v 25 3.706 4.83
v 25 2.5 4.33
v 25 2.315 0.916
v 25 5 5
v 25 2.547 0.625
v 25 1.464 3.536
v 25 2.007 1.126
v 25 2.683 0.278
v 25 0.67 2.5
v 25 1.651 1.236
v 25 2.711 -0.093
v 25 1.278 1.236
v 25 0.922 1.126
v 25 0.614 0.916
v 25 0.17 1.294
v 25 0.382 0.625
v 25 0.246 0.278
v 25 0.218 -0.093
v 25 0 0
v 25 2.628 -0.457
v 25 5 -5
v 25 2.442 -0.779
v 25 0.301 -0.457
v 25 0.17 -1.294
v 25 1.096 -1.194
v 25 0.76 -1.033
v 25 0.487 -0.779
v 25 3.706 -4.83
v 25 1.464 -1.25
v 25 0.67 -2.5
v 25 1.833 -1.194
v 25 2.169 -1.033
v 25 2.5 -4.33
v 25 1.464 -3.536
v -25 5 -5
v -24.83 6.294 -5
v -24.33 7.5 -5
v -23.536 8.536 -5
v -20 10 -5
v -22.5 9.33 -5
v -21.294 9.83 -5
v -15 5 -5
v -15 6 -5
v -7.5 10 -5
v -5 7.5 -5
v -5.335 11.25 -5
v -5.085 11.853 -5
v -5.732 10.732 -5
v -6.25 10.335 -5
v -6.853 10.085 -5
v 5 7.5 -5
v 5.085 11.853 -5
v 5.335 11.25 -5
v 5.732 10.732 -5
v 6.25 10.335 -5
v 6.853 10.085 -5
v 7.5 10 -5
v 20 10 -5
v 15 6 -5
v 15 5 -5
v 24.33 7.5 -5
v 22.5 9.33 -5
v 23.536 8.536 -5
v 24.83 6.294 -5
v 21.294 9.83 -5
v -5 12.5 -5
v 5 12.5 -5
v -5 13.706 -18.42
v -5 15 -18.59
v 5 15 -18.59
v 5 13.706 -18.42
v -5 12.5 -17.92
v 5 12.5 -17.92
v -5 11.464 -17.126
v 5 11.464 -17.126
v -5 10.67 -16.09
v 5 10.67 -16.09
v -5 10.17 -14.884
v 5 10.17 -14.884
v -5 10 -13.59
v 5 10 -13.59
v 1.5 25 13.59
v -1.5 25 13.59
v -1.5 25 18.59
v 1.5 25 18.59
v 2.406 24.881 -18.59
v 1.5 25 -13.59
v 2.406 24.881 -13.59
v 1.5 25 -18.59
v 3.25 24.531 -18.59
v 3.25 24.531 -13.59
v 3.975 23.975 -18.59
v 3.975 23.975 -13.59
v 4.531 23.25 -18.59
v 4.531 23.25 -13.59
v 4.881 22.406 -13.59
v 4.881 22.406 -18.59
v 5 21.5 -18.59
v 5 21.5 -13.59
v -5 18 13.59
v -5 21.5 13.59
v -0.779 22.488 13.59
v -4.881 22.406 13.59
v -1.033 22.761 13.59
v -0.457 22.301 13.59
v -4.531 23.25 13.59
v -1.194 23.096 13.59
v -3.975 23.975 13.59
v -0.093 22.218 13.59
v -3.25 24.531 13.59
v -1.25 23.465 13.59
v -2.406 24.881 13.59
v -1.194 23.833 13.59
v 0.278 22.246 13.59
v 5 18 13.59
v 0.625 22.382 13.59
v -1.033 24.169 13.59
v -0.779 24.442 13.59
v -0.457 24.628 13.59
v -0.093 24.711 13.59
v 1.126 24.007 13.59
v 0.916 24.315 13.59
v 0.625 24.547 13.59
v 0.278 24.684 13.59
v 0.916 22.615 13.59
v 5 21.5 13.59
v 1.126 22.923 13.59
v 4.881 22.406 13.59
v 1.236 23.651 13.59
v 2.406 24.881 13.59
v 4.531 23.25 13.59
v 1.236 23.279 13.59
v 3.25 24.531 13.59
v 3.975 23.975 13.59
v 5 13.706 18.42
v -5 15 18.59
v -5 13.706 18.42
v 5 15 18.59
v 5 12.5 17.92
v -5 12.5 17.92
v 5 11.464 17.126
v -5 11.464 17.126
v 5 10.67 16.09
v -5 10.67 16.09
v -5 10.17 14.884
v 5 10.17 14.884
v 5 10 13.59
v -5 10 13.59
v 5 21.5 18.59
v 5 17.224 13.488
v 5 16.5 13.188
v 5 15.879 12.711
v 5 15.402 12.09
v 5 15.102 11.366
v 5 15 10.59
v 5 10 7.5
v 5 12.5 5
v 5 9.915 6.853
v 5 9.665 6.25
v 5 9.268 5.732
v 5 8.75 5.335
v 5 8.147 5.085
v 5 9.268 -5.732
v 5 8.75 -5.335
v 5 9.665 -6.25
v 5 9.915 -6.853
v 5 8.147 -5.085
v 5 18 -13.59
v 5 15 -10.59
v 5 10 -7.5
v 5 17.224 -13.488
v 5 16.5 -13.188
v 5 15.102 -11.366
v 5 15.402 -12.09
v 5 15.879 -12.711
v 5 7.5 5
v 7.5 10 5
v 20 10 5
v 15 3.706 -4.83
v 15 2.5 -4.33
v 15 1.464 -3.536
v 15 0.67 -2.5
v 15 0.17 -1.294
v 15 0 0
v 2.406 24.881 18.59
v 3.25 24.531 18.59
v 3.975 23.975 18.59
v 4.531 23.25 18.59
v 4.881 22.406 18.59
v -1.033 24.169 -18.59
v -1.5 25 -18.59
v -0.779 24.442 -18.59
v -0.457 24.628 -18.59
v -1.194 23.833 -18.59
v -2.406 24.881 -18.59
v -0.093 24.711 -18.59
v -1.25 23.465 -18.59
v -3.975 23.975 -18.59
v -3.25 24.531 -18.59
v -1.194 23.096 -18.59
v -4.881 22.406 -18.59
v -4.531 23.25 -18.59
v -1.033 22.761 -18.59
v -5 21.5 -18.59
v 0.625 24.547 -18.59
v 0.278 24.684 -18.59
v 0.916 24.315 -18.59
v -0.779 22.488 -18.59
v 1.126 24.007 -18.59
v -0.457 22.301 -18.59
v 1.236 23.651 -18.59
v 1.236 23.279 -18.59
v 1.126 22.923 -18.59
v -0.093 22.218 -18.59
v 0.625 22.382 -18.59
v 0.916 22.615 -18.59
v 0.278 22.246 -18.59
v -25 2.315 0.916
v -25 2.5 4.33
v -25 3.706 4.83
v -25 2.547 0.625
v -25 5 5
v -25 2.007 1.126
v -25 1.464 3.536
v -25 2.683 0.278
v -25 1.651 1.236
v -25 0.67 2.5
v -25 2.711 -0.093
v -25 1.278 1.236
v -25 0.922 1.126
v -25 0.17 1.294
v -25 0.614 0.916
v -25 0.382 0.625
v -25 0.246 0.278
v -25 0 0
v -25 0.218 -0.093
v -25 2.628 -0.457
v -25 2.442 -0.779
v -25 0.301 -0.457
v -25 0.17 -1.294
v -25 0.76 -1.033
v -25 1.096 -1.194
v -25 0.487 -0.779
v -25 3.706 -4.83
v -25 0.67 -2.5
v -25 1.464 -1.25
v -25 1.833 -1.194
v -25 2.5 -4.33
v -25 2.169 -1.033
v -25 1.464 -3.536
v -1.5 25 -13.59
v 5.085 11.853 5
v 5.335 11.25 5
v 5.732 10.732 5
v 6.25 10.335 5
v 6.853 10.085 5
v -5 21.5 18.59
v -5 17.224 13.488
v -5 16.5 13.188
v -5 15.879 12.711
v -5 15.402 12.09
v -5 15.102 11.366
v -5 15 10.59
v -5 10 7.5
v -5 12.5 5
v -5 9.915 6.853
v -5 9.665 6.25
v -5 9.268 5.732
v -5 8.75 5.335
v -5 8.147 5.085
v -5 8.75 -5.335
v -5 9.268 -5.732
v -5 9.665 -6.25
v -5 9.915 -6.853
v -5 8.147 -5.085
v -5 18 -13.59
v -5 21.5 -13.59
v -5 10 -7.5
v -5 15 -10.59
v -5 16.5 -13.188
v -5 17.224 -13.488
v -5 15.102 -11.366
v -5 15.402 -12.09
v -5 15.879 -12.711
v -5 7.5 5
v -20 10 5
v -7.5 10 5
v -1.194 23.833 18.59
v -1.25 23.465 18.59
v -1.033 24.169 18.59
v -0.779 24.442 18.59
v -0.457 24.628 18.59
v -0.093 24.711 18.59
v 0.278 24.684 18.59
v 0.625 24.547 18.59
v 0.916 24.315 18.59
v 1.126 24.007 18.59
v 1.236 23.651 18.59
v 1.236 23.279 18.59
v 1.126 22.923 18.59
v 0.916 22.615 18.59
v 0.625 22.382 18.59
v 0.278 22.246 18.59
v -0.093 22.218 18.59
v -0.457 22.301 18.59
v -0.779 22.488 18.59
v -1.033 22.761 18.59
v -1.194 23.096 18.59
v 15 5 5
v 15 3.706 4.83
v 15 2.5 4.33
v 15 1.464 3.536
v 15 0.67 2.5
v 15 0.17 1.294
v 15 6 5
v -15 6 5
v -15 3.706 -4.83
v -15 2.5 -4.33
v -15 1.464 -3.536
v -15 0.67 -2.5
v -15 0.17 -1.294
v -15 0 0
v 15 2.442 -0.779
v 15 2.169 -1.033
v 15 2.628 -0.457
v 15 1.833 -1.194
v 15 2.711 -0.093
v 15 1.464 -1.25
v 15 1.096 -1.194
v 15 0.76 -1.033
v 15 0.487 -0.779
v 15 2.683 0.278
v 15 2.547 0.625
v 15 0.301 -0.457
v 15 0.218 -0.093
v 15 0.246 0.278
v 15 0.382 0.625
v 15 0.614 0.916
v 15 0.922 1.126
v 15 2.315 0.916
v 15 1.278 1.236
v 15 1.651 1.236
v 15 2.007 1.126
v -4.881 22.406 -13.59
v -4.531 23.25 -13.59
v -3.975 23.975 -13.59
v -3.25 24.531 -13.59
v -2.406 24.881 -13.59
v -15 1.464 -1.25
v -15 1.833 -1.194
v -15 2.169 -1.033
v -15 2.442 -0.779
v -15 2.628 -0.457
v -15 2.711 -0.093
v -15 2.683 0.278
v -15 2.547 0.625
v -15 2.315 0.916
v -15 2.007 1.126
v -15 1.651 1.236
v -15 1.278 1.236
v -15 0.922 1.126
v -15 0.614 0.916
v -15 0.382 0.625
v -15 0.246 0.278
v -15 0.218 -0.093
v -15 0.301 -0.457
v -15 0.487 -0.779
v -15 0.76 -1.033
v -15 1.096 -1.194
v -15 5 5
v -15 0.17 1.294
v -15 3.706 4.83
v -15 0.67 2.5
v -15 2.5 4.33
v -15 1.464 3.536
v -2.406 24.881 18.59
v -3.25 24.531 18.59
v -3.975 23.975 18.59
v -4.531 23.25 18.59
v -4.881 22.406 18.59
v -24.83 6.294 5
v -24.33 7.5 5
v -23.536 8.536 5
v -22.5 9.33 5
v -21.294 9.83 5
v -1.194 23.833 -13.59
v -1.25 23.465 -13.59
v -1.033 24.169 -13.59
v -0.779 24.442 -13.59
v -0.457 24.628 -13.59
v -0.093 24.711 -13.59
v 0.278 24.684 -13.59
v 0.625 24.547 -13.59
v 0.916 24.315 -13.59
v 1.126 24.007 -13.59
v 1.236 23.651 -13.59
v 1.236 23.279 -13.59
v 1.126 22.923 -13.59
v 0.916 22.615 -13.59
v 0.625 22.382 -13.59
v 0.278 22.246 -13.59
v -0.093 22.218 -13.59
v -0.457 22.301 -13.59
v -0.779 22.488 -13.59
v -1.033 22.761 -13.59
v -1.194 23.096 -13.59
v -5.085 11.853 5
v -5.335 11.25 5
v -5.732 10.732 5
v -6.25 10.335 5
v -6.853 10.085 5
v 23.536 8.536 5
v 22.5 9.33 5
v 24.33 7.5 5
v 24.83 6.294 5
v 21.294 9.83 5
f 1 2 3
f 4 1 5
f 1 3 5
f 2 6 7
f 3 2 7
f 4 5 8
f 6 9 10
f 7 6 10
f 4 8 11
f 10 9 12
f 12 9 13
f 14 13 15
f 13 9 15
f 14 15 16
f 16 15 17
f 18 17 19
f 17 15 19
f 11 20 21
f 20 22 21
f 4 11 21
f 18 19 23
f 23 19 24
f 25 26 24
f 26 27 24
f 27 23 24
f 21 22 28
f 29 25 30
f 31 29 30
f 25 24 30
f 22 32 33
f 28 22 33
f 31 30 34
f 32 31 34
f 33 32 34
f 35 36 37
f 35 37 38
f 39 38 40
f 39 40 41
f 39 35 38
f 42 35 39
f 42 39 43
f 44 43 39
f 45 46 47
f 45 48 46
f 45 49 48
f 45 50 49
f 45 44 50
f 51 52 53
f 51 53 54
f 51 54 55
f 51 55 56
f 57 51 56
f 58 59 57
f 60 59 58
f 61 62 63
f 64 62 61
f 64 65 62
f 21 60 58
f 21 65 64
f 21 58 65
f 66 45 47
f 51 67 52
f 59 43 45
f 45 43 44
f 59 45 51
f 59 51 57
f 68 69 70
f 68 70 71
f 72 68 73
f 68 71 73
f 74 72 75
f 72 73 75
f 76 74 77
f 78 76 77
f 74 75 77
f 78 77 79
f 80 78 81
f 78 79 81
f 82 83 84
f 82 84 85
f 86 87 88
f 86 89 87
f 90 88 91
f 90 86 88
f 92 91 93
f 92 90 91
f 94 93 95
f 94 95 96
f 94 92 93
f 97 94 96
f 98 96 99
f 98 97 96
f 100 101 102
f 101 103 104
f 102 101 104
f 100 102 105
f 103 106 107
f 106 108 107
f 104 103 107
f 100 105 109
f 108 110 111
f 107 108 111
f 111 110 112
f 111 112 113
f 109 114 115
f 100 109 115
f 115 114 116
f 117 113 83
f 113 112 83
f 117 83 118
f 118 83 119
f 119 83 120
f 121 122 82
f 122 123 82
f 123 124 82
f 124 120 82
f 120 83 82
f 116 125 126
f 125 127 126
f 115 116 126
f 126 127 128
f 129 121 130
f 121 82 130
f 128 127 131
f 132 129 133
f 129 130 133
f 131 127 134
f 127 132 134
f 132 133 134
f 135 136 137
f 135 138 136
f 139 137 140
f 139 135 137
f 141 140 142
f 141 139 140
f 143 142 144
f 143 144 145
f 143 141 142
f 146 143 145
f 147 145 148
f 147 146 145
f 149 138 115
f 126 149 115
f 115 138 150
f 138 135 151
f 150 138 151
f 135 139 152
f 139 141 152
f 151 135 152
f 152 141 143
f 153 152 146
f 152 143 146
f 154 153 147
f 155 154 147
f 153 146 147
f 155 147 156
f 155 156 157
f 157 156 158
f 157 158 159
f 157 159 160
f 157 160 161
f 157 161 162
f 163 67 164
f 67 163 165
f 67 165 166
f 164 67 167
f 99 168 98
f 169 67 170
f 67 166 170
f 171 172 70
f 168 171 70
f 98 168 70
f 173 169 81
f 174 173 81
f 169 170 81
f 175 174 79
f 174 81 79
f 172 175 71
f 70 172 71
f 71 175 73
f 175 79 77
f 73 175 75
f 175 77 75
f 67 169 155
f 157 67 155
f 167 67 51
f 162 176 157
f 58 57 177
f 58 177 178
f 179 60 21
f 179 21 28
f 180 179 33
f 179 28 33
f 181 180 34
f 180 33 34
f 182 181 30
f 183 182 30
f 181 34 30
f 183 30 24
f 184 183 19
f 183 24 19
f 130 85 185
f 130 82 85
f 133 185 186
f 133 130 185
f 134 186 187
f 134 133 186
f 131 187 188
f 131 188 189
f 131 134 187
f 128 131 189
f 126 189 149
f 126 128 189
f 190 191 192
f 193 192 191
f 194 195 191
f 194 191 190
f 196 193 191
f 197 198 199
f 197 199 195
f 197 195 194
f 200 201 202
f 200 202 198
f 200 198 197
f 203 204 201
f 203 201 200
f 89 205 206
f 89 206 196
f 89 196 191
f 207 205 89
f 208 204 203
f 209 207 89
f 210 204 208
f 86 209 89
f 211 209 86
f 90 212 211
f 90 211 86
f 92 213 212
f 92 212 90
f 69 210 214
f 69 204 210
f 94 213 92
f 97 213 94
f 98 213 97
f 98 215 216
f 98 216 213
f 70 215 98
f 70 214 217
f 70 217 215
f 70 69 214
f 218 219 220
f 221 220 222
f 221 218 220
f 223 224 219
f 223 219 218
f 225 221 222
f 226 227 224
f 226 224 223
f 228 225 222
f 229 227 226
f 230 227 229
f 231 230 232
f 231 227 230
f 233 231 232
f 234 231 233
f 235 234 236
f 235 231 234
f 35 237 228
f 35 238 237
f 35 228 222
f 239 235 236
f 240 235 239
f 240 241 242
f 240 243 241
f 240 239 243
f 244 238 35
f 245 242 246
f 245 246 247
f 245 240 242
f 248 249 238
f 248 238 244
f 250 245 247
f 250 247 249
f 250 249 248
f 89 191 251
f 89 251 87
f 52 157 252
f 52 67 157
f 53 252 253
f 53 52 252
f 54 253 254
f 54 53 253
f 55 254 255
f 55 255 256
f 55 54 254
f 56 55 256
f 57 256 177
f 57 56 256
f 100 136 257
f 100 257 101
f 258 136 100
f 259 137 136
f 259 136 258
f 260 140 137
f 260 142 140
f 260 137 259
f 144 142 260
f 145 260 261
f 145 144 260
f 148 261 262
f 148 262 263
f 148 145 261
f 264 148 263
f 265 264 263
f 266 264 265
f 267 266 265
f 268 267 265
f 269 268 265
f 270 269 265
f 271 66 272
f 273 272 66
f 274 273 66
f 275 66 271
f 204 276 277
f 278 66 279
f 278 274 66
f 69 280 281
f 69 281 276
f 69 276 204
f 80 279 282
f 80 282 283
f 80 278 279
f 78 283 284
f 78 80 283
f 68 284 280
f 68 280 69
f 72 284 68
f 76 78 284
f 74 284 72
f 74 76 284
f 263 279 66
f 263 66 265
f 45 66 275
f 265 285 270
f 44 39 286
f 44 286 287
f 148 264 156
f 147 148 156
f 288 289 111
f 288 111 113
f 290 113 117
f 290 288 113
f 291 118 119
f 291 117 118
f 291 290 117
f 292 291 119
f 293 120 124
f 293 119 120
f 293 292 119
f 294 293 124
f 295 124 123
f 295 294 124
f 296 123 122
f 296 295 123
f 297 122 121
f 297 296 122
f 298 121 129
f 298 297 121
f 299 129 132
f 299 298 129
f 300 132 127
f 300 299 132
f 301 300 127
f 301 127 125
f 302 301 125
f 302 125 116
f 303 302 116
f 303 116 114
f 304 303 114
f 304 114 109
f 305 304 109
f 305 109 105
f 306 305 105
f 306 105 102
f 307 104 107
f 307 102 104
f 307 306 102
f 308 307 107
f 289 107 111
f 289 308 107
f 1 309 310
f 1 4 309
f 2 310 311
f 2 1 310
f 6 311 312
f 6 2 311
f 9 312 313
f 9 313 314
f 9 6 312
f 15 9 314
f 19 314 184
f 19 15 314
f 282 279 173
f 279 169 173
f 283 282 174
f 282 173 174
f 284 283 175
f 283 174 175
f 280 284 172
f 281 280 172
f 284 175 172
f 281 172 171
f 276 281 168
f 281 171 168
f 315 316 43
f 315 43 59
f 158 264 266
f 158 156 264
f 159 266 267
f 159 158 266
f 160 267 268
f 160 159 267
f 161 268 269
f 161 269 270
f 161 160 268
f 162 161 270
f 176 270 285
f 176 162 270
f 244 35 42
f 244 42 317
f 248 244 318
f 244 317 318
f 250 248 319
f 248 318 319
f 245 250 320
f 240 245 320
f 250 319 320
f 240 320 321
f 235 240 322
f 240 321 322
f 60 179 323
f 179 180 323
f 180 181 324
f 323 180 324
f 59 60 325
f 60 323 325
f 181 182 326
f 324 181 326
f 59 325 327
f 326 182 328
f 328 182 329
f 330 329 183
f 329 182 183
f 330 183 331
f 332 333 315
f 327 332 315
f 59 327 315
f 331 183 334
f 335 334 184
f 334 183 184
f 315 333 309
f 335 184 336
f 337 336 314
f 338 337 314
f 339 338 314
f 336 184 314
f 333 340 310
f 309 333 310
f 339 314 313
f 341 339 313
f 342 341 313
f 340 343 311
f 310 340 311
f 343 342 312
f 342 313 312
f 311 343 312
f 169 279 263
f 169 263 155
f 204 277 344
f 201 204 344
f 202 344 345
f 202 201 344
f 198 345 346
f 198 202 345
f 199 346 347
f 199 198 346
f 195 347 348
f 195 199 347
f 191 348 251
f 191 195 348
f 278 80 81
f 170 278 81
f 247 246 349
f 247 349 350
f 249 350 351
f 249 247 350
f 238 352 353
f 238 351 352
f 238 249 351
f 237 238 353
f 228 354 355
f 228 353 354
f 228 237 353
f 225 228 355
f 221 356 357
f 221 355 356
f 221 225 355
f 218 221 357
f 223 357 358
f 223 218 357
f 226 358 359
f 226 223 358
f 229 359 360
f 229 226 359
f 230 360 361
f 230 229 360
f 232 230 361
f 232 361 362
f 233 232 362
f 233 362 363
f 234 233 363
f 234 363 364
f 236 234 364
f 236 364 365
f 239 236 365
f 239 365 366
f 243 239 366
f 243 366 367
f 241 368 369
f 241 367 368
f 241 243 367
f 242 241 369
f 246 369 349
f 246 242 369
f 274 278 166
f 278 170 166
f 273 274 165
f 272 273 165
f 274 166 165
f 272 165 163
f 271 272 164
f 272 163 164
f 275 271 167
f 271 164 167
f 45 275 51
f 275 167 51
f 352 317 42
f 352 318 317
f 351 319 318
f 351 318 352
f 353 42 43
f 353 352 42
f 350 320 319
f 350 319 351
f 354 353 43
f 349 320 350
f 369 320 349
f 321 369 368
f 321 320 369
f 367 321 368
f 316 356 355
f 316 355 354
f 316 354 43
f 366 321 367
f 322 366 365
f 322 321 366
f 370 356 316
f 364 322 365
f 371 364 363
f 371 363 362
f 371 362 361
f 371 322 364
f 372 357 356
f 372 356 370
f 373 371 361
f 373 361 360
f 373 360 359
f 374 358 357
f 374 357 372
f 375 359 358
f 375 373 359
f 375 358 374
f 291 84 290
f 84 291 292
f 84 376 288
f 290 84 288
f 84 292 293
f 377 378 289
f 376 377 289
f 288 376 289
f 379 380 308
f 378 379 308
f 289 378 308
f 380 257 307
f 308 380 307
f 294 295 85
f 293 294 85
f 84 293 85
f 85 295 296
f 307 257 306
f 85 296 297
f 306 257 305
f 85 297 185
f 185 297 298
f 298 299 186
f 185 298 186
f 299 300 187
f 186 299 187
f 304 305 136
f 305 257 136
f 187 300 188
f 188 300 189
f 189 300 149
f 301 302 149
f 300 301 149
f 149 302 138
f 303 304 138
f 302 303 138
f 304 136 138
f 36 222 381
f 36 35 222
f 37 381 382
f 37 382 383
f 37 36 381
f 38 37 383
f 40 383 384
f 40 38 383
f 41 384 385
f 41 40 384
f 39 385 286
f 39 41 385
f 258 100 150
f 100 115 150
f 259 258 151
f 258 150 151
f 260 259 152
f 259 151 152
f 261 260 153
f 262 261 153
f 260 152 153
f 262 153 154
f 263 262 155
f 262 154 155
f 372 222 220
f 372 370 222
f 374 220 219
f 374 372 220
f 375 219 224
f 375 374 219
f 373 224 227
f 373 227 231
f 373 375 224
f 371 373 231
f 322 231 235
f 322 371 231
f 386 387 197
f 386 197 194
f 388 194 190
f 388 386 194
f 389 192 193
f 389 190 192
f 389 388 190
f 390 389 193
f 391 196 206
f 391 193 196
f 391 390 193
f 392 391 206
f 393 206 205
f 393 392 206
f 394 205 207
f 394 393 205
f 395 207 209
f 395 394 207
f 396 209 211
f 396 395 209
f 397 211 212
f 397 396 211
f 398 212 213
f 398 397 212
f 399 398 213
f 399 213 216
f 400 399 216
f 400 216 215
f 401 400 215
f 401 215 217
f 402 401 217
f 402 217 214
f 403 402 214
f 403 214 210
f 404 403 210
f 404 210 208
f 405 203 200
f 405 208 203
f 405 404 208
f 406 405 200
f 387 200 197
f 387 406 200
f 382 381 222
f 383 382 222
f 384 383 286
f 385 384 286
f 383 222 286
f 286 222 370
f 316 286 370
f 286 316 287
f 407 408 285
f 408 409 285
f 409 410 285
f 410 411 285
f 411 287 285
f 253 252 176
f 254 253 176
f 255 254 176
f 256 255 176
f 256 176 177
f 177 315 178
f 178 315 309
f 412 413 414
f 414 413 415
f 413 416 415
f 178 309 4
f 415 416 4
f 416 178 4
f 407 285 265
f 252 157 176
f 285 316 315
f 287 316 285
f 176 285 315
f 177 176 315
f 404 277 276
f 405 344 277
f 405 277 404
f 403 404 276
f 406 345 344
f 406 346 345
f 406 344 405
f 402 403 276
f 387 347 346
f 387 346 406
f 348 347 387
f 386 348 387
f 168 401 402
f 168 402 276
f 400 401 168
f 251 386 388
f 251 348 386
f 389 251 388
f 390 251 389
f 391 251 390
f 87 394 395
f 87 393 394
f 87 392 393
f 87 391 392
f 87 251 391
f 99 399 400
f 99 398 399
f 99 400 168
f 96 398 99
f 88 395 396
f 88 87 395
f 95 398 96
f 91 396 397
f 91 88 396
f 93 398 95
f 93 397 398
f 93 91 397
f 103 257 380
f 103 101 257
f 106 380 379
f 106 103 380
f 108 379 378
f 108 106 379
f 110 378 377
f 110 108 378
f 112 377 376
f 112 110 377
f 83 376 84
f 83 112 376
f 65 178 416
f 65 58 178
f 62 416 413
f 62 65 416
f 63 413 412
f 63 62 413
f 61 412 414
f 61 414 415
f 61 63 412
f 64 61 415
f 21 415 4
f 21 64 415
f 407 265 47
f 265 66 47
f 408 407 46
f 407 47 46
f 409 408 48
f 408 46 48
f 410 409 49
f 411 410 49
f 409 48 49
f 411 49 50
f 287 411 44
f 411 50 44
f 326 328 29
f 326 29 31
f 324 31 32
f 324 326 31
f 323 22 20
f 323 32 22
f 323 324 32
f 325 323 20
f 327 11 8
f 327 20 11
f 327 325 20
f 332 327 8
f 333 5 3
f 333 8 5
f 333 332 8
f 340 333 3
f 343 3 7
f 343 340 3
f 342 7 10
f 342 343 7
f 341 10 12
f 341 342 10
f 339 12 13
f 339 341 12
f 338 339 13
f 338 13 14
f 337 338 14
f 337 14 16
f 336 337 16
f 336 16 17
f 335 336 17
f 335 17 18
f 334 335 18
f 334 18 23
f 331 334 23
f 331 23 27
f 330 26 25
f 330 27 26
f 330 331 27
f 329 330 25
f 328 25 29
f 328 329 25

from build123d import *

# Parameters (mm, degrees)
SKETCH1_W               = 50
SKETCH1_H               = 10
BOSS_EXTRUDE1_DEPTH     = 10
SKETCH2_W               = 30
SKETCH2_H               = 10
CUT_EXTRUDE1_DEPTH      = 6
FILLET3_R               = 5
CUT_EXTRUDE2_DEPTH      = 42.533119315
CUT_EXTRUDE2_DEPTH_BACK = 42.533119315
SKETCH3_R               = 1.25
FILLET4_R               = 5
SKETCH4_W               = 10
SKETCH4_H               = 37.18
BOSS_EXTRUDE2_DEPTH     = 15
FILLET7_R               = 2.5
SKETCH5_W               = 10
SKETCH5_H               = 27.18
CUT_EXTRUDE3_DEPTH      = 10
FILLET8_R               = 2.5
CUT_EXTRUDE4_DEPTH      = 48.807451302
CUT_EXTRUDE4_DEPTH_BACK = 48.807451302
SKETCH6_R               = 1.25
FILLET9_R               = 3.5
FILLET10_R              = 5
FILLET11_R              = 3


with BuildPart() as part:
    # Sketch1 → Boss-Extrude1 (new body)
    with BuildSketch(Plane(origin=(0, 0, 0), x_dir=(1, 0, 0), z_dir=(0, 1, 0))):
        Rectangle(SKETCH1_W, SKETCH1_H)
    extrude(amount=BOSS_EXTRUDE1_DEPTH)

    # Sketch2 → Cut-Extrude1 (cut)
    with BuildSketch(Plane.XZ):
        Rectangle(SKETCH2_W, SKETCH2_H)
    extrude(amount=-CUT_EXTRUDE1_DEPTH, mode=Mode.SUBTRACT)

    # Fillet3
    fillet3_edges = [part.edges().sort_by_distance(p)[0] for p in [
        (-20, 0, -5),
        (20, 0, -5),
        (20, 0, 5),
        (-20, 0, 5),
    ]]
    fillet(fillet3_edges, radius=FILLET3_R - 0.0001)  # a hair under: the kernel refuses the full size

    # Sketch3 → Cut-Extrude2 (cut, two sides: drawn at the far end of the back side and taken through both)
    with BuildSketch(Plane(origin=(-15, 0, 0), x_dir=(0, 0, -1), z_dir=(1, 0, 0)).offset(-CUT_EXTRUDE2_DEPTH_BACK)):
        with Locations((0, 1.464466094)):
            Circle(SKETCH3_R)
    extrude(amount=CUT_EXTRUDE2_DEPTH + CUT_EXTRUDE2_DEPTH_BACK, mode=Mode.SUBTRACT)

    # Fillet4
    fillet4_edges = [part.edges().sort_by_distance(p)[0] for p in [
        (25, 10, 0),
        (-25, 10, 0),
    ]]
    fillet(fillet4_edges, radius=FILLET4_R)

    # Sketch4 → Boss-Extrude2 (add)
    with BuildSketch(Plane(origin=(0, 10, 0), x_dir=(1, 0, 0), z_dir=(0, 1, 0))):
        Rectangle(SKETCH4_W, SKETCH4_H)
    extrude(amount=BOSS_EXTRUDE2_DEPTH)

    # Fillet7
    fillet7_edges = [part.edges().sort_by_distance(p)[0] for p in [
        (0, 10, 5),
        (0, 10, -5),
    ]]
    fillet(fillet7_edges, radius=FILLET7_R)

    # Sketch5 → Cut-Extrude3 (cut)
    with BuildSketch(Plane(origin=(0, 25, 0), x_dir=(1, 0, 0), z_dir=(0, 1, 0))):
        Rectangle(SKETCH5_W, SKETCH5_H)
    extrude(amount=-CUT_EXTRUDE3_DEPTH, mode=Mode.SUBTRACT)

    # Fillet8
    fillet8_edges = [part.edges().sort_by_distance(p)[0] for p in [
        (5, 10, 0),
        (-5, 10, 0),
    ]]
    fillet(fillet8_edges, radius=FILLET8_R)

    # Sketch6 → Cut-Extrude4 (cut, two sides: drawn at the far end of the back side and taken through both)
    with BuildSketch(Plane(origin=(0, 0, 13.59), x_dir=(-1, 0, 0), z_dir=(0, 0, -1)).offset(-CUT_EXTRUDE4_DEPTH_BACK)):
        with Locations((0, 23.464881358)):
            Circle(SKETCH6_R)
    extrude(amount=CUT_EXTRUDE4_DEPTH + CUT_EXTRUDE4_DEPTH_BACK, mode=Mode.SUBTRACT)

    # Fillet9
    fillet9_edges = [part.edges().sort_by_distance(p)[0] for p in [
        (-5, 25, 16.09),
        (5, 25, -16.09),
        (-5, 25, -16.09),
        (5, 25, 16.09),
    ]]
    fillet(fillet9_edges, radius=FILLET9_R)

    # Fillet10
    fillet10_edges = [part.edges().sort_by_distance(p)[0] for p in [
        (0, 10, 18.59),
        (0, 10, -18.59),
    ]]
    fillet(fillet10_edges, radius=FILLET10_R)

    # Fillet11
    fillet11_edges = [part.edges().sort_by_distance(p)[0] for p in [
        (0, 15, 13.59),
        (0, 15, -13.59),
    ]]
    fillet(fillet11_edges, radius=FILLET11_R)


solid = part.part
